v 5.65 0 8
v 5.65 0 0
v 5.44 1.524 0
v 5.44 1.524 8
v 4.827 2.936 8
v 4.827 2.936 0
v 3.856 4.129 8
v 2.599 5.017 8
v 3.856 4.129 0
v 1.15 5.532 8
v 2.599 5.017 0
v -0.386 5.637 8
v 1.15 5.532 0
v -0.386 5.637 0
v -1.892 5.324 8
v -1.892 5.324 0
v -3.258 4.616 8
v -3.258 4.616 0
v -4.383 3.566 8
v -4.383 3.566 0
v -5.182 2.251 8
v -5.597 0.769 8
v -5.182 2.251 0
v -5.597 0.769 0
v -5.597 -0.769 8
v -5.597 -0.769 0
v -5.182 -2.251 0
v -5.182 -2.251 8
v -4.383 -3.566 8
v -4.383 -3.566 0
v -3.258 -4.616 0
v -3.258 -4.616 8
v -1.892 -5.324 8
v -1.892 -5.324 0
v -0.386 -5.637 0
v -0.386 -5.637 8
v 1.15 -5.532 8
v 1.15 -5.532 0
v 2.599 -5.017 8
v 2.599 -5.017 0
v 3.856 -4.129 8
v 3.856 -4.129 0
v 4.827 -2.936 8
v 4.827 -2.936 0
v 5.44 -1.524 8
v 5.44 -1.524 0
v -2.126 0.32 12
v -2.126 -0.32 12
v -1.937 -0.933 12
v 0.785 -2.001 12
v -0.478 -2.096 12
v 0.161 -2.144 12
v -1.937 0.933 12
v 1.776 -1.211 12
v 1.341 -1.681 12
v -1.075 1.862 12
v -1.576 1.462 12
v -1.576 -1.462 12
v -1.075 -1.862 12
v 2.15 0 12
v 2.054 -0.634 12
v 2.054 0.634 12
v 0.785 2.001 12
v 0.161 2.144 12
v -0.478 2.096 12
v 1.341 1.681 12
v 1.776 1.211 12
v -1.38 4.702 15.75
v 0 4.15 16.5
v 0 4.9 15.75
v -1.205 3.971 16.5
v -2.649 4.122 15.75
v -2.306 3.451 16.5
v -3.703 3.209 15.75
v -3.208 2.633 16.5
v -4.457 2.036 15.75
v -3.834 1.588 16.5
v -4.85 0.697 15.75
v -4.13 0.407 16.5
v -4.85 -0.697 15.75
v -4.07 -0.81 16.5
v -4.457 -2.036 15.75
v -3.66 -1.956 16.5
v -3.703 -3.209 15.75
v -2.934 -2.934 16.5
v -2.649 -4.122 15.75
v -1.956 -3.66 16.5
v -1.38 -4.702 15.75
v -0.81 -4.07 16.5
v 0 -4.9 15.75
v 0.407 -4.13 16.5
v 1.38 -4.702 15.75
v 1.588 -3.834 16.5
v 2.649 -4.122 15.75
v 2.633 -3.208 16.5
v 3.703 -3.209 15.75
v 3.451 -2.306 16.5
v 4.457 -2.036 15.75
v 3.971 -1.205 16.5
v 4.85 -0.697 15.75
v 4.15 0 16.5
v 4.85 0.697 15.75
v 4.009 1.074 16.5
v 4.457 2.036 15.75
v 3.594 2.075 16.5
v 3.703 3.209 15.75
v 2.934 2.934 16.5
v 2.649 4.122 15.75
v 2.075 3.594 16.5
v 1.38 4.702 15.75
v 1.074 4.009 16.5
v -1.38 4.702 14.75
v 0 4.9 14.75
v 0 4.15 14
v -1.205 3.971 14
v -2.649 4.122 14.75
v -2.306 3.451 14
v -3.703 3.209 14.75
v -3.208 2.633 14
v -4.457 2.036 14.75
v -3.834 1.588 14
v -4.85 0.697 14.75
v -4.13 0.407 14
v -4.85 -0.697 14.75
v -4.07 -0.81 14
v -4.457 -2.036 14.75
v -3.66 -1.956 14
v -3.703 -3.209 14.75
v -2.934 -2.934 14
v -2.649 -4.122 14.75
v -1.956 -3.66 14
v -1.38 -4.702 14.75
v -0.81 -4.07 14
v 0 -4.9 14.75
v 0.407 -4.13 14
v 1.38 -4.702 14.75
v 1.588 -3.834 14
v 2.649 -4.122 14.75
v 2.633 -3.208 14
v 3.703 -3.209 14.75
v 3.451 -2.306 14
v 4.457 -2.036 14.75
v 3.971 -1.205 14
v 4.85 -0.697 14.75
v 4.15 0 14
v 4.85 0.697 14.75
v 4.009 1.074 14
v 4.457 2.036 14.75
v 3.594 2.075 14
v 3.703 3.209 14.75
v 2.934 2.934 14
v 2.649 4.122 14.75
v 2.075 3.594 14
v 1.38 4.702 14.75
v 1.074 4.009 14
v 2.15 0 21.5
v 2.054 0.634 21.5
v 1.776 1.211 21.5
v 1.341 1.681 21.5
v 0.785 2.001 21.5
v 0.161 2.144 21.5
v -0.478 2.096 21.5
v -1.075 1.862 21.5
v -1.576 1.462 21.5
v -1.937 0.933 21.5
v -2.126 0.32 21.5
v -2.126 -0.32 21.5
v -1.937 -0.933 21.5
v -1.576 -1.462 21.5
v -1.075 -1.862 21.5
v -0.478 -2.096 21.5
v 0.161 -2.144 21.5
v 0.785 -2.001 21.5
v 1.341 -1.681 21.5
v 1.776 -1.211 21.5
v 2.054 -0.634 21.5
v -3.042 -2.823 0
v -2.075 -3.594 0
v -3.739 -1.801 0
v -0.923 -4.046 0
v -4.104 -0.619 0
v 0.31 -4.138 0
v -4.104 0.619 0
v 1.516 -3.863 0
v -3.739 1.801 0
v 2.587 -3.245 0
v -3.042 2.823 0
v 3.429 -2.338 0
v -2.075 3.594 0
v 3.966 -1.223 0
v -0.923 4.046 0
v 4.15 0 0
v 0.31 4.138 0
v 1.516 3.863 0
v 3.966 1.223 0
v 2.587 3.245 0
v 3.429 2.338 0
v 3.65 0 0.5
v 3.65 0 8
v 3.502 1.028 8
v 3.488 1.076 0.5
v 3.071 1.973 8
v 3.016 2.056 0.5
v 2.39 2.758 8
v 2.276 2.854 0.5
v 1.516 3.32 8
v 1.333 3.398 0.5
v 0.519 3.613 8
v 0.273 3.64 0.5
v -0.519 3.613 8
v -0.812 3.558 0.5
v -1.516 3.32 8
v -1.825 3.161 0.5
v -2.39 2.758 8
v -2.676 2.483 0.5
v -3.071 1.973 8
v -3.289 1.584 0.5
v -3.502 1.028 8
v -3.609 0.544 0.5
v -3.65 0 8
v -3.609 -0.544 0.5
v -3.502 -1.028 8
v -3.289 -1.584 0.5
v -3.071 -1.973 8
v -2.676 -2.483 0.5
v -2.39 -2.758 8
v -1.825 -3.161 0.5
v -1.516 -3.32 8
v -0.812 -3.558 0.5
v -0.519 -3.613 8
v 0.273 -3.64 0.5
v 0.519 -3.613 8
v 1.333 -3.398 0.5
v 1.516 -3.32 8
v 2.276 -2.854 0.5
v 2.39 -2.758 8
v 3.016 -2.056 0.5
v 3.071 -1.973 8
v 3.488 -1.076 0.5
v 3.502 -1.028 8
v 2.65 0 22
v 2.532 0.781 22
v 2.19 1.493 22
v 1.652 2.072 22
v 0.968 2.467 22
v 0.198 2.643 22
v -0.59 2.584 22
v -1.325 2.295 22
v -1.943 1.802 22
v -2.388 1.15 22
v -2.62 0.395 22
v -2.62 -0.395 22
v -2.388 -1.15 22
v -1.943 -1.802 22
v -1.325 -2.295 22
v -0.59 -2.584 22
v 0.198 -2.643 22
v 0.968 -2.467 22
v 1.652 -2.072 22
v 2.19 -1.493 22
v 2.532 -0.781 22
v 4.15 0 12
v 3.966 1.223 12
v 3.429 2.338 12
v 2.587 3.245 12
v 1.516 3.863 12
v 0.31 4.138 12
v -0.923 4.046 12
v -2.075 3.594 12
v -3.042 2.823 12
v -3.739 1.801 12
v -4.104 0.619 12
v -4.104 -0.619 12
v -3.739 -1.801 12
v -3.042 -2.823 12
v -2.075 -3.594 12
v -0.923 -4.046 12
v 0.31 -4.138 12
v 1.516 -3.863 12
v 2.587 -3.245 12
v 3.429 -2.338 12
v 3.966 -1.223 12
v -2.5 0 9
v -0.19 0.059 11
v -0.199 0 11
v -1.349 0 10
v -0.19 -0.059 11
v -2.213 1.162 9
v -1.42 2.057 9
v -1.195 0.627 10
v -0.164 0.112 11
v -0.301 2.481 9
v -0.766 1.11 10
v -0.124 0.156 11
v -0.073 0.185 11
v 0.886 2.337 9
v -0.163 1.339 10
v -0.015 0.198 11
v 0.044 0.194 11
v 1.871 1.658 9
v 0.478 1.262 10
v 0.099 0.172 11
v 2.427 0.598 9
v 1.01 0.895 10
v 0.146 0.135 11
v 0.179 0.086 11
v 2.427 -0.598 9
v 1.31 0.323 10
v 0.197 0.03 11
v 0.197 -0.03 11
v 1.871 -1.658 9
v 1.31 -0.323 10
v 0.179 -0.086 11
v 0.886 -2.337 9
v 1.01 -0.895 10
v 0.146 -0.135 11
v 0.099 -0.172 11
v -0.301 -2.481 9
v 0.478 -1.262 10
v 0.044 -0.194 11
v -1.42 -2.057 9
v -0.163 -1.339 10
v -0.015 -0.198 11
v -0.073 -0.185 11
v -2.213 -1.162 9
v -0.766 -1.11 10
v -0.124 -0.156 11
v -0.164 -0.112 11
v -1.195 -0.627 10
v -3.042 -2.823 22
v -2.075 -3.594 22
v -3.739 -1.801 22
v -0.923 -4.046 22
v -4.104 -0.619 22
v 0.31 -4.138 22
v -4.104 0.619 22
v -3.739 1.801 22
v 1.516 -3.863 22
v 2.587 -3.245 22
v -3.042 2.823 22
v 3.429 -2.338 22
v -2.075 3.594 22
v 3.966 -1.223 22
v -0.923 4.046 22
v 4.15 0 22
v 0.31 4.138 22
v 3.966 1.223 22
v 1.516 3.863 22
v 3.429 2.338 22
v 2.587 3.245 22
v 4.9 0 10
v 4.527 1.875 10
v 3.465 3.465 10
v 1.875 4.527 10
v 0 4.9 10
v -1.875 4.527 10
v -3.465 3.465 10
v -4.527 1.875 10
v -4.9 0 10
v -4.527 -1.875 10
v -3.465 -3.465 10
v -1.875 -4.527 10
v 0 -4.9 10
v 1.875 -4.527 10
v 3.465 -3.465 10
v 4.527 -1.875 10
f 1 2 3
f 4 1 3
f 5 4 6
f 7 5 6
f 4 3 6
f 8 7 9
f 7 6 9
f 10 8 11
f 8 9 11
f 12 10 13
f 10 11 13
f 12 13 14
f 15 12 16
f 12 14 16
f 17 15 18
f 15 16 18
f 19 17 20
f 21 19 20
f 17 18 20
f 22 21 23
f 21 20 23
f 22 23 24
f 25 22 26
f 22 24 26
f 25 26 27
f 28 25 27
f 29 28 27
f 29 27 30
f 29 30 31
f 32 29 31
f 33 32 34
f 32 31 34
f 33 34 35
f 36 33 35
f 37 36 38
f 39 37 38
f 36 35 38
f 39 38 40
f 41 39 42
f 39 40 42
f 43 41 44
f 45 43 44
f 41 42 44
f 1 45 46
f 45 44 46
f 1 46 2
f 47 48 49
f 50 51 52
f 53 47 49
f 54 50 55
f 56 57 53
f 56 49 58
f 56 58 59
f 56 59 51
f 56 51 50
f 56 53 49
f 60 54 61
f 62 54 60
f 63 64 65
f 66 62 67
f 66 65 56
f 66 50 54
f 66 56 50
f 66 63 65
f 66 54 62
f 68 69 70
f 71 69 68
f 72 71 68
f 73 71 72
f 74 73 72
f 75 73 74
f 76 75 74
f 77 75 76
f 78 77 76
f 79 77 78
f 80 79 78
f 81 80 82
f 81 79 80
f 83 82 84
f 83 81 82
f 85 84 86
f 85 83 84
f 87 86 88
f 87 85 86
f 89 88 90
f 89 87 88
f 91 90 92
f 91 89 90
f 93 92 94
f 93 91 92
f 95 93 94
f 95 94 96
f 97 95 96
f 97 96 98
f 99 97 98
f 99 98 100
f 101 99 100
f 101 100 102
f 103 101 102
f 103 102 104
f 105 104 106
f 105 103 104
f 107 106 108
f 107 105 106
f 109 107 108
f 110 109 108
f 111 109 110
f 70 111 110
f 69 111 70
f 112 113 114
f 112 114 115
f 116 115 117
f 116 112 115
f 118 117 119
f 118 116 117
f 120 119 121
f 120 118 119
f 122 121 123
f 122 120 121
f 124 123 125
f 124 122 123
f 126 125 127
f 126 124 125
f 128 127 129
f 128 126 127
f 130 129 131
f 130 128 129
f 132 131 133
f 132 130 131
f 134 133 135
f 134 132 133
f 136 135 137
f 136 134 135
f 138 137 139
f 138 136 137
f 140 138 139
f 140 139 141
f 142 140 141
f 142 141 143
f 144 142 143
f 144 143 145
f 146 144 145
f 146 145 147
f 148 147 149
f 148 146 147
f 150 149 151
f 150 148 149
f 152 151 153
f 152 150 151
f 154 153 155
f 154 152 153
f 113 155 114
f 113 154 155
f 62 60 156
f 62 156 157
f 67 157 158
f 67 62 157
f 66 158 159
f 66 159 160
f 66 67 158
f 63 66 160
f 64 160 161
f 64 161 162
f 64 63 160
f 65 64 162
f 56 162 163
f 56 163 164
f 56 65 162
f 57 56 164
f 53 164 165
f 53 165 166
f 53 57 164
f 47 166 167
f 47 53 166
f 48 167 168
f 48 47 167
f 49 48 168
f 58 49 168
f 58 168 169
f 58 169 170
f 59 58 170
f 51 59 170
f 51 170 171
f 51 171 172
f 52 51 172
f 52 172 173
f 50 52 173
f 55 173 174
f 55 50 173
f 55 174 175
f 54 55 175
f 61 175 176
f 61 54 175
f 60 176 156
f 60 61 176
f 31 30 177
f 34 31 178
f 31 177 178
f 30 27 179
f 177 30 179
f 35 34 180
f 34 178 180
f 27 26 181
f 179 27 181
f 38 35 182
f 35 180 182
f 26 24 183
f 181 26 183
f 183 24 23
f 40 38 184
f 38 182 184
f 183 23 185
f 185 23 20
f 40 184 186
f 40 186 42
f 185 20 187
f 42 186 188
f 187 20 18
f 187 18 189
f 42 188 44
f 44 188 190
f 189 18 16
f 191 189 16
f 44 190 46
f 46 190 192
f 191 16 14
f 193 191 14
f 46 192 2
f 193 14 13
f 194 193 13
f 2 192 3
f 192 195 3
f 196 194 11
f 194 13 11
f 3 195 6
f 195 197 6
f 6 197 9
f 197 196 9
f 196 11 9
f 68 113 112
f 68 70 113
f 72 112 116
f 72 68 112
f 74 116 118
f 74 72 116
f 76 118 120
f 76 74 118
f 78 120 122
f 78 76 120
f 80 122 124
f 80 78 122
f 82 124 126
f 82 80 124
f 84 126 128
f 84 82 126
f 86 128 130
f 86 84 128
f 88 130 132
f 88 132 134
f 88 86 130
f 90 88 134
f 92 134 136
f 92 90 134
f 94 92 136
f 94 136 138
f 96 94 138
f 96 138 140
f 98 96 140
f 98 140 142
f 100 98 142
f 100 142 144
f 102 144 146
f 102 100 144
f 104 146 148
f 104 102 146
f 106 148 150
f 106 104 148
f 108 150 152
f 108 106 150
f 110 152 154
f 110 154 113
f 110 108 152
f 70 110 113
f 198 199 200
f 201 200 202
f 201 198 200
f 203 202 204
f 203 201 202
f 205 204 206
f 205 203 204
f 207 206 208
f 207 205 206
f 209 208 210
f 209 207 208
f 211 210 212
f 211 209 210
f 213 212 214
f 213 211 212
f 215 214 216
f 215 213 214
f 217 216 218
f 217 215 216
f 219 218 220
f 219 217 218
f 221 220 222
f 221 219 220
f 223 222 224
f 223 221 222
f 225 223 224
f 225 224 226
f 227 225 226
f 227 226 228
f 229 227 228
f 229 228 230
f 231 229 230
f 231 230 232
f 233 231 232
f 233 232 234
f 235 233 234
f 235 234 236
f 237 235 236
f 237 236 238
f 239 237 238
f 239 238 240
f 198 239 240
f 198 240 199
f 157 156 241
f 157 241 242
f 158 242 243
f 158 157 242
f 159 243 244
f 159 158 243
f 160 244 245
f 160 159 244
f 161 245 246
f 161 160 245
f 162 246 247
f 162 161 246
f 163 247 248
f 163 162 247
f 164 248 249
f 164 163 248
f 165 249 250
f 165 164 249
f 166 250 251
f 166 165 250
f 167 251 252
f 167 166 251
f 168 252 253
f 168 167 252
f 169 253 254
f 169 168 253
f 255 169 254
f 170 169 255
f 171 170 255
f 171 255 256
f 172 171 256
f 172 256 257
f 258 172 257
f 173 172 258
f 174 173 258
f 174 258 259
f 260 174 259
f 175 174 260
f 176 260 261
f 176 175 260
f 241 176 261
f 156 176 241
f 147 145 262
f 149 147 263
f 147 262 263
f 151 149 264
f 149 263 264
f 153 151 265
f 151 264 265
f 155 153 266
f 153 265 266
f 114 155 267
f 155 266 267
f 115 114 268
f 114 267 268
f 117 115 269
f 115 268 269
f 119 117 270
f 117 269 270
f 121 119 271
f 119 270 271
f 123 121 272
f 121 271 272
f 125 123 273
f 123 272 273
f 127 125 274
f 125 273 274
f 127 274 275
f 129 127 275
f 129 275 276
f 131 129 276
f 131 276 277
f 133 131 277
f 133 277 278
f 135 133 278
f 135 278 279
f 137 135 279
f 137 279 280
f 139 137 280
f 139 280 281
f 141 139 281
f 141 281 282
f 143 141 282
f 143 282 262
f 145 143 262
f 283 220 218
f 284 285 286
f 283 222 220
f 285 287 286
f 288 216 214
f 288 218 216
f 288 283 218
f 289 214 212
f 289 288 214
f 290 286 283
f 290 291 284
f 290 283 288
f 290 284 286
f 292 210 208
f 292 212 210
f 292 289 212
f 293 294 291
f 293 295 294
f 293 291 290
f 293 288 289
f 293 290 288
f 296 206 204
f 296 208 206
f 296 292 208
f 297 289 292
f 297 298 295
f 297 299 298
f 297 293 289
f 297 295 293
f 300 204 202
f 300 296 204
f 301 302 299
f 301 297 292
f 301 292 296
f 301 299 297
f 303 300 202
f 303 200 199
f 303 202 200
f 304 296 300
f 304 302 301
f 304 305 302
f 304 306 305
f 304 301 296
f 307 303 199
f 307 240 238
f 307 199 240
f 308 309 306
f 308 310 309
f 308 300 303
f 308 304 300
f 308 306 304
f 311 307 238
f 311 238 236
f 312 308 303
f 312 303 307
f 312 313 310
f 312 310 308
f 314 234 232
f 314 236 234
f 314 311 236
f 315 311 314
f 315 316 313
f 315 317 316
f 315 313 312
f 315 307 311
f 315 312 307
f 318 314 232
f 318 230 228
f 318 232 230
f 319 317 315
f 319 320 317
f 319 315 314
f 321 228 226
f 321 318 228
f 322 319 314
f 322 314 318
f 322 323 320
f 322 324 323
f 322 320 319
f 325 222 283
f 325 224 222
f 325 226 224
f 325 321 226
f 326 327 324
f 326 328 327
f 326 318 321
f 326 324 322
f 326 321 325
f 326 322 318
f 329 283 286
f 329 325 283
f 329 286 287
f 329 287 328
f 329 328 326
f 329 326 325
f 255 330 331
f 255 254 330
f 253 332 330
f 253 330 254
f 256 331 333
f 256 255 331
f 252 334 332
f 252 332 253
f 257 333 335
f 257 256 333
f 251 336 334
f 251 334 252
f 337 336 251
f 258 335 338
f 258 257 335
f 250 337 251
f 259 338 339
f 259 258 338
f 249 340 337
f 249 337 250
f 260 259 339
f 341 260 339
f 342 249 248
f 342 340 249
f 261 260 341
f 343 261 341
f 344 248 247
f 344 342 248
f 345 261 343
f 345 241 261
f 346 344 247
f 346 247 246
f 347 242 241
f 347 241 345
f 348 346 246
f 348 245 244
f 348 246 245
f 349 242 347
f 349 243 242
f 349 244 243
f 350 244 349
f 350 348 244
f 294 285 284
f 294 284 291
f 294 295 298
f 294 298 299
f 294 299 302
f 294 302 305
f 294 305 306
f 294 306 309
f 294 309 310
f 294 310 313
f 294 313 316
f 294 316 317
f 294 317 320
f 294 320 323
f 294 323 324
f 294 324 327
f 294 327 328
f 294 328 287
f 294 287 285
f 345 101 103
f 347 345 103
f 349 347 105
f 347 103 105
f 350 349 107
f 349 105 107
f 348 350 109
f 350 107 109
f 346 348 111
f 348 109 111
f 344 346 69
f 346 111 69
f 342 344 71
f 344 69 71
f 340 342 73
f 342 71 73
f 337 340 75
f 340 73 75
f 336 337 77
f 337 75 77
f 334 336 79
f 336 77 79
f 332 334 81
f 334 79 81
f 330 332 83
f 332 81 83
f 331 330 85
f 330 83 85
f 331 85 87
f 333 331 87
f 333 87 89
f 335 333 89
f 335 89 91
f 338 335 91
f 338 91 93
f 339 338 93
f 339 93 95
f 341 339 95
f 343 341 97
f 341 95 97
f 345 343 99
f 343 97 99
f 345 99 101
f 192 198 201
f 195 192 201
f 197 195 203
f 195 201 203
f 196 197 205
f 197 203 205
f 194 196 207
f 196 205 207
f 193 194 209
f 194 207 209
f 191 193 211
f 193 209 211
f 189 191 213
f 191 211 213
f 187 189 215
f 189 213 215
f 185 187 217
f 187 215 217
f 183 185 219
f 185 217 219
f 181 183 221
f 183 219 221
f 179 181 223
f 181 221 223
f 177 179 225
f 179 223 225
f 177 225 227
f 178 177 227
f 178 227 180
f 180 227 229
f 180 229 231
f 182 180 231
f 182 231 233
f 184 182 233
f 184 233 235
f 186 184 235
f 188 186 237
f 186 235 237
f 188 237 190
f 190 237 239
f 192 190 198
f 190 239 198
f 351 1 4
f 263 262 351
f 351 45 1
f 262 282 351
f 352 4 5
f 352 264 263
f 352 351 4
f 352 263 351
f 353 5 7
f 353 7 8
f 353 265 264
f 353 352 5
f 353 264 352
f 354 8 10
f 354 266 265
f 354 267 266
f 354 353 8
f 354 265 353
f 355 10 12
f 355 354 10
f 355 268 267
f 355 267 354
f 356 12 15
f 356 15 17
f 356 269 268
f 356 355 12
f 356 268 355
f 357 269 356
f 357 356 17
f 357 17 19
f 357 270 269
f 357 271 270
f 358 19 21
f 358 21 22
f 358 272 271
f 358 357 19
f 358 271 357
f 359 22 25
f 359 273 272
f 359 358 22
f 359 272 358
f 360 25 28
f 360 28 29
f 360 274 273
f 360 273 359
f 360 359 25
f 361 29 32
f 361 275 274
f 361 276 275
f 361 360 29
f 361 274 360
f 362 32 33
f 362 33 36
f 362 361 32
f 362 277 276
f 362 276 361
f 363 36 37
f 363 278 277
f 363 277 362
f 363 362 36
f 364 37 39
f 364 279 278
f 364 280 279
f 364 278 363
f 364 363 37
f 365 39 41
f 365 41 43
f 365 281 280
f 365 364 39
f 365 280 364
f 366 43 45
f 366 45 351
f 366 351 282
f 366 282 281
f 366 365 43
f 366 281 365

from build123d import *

# Parameters (mm, degrees)
SKETCH1_R           = 5.65
SKETCH1_R_2         = 3.65
BOSS_EXTRUDE1_DEPTH = 8
SKETCH3_R           = 5.65
SKETCH2_R           = 4.15
SKETCH4_R           = 3.65
CUT_EXTRUDE2_DEPTH  = 3
CUT_EXTRUDE2_TAPER  = 49
SKETCH6_R           = 4.15
SKETCH6_R_2         = 2.15
BOSS_EXTRUDE2_DEPTH = 10
CHAMFER1_SIZE       = 0.5
CHAMFER2_SIZE       = 0.5


with BuildPart() as part:
    # Sketch1 → Boss-Extrude1 (new body)
    with BuildSketch(Plane.XY):
        Circle(SKETCH1_R)
        Circle(SKETCH1_R_2, mode=Mode.SUBTRACT)
    extrude(amount=BOSS_EXTRUDE1_DEPTH)

    # Sketch3 → Loft1 section 0
    with BuildSketch(Plane.XY.offset(8)):
        Circle(SKETCH3_R)
    # Sketch2 → Loft1 section 1
    with BuildSketch(Plane.XY.offset(12)):
        Circle(SKETCH2_R)
    loft()

    # Sketch4 → Cut-Extrude2 (cut)
    with BuildSketch(Plane(origin=(0, 0, 8), x_dir=(-1, 0, 0), z_dir=(0, 0, -1))):
        Circle(SKETCH4_R)
    extrude(amount=-CUT_EXTRUDE2_DEPTH, taper=CUT_EXTRUDE2_TAPER, mode=Mode.SUBTRACT)

    # Sketch6 → Boss-Extrude2 (add)
    with BuildSketch(Plane.XY.offset(12)):
        Circle(SKETCH6_R)
        Circle(SKETCH6_R_2, mode=Mode.SUBTRACT)
    extrude(amount=BOSS_EXTRUDE2_DEPTH)

    # Sketch7 → Revolve1 (revolve)
    with BuildSketch(Plane(origin=(0, 0, 0), x_dir=(0, 0, -1), z_dir=(1, 0, 0))):
        Polygon((-14, 4.15), (-14.75, 4.9), (-15.75, 4.9), (-16.5, 4.15), align=None)
    revolve(axis=Axis((0, 0, -80.9), (0, 0, 1)))

    # Chamfer1
    chamfer1_edges = [part.edges().sort_by_distance(p)[0] for p in [
        (-3.65, 0, 0),
    ]]
    chamfer(chamfer1_edges, length=CHAMFER1_SIZE)

    # Chamfer2
    chamfer2_edges = [part.edges().sort_by_distance(p)[0] for p in [
        (-2.15, 0, 22),
    ]]
    chamfer(chamfer2_edges, length=CHAMFER2_SIZE)


solid = part.part
